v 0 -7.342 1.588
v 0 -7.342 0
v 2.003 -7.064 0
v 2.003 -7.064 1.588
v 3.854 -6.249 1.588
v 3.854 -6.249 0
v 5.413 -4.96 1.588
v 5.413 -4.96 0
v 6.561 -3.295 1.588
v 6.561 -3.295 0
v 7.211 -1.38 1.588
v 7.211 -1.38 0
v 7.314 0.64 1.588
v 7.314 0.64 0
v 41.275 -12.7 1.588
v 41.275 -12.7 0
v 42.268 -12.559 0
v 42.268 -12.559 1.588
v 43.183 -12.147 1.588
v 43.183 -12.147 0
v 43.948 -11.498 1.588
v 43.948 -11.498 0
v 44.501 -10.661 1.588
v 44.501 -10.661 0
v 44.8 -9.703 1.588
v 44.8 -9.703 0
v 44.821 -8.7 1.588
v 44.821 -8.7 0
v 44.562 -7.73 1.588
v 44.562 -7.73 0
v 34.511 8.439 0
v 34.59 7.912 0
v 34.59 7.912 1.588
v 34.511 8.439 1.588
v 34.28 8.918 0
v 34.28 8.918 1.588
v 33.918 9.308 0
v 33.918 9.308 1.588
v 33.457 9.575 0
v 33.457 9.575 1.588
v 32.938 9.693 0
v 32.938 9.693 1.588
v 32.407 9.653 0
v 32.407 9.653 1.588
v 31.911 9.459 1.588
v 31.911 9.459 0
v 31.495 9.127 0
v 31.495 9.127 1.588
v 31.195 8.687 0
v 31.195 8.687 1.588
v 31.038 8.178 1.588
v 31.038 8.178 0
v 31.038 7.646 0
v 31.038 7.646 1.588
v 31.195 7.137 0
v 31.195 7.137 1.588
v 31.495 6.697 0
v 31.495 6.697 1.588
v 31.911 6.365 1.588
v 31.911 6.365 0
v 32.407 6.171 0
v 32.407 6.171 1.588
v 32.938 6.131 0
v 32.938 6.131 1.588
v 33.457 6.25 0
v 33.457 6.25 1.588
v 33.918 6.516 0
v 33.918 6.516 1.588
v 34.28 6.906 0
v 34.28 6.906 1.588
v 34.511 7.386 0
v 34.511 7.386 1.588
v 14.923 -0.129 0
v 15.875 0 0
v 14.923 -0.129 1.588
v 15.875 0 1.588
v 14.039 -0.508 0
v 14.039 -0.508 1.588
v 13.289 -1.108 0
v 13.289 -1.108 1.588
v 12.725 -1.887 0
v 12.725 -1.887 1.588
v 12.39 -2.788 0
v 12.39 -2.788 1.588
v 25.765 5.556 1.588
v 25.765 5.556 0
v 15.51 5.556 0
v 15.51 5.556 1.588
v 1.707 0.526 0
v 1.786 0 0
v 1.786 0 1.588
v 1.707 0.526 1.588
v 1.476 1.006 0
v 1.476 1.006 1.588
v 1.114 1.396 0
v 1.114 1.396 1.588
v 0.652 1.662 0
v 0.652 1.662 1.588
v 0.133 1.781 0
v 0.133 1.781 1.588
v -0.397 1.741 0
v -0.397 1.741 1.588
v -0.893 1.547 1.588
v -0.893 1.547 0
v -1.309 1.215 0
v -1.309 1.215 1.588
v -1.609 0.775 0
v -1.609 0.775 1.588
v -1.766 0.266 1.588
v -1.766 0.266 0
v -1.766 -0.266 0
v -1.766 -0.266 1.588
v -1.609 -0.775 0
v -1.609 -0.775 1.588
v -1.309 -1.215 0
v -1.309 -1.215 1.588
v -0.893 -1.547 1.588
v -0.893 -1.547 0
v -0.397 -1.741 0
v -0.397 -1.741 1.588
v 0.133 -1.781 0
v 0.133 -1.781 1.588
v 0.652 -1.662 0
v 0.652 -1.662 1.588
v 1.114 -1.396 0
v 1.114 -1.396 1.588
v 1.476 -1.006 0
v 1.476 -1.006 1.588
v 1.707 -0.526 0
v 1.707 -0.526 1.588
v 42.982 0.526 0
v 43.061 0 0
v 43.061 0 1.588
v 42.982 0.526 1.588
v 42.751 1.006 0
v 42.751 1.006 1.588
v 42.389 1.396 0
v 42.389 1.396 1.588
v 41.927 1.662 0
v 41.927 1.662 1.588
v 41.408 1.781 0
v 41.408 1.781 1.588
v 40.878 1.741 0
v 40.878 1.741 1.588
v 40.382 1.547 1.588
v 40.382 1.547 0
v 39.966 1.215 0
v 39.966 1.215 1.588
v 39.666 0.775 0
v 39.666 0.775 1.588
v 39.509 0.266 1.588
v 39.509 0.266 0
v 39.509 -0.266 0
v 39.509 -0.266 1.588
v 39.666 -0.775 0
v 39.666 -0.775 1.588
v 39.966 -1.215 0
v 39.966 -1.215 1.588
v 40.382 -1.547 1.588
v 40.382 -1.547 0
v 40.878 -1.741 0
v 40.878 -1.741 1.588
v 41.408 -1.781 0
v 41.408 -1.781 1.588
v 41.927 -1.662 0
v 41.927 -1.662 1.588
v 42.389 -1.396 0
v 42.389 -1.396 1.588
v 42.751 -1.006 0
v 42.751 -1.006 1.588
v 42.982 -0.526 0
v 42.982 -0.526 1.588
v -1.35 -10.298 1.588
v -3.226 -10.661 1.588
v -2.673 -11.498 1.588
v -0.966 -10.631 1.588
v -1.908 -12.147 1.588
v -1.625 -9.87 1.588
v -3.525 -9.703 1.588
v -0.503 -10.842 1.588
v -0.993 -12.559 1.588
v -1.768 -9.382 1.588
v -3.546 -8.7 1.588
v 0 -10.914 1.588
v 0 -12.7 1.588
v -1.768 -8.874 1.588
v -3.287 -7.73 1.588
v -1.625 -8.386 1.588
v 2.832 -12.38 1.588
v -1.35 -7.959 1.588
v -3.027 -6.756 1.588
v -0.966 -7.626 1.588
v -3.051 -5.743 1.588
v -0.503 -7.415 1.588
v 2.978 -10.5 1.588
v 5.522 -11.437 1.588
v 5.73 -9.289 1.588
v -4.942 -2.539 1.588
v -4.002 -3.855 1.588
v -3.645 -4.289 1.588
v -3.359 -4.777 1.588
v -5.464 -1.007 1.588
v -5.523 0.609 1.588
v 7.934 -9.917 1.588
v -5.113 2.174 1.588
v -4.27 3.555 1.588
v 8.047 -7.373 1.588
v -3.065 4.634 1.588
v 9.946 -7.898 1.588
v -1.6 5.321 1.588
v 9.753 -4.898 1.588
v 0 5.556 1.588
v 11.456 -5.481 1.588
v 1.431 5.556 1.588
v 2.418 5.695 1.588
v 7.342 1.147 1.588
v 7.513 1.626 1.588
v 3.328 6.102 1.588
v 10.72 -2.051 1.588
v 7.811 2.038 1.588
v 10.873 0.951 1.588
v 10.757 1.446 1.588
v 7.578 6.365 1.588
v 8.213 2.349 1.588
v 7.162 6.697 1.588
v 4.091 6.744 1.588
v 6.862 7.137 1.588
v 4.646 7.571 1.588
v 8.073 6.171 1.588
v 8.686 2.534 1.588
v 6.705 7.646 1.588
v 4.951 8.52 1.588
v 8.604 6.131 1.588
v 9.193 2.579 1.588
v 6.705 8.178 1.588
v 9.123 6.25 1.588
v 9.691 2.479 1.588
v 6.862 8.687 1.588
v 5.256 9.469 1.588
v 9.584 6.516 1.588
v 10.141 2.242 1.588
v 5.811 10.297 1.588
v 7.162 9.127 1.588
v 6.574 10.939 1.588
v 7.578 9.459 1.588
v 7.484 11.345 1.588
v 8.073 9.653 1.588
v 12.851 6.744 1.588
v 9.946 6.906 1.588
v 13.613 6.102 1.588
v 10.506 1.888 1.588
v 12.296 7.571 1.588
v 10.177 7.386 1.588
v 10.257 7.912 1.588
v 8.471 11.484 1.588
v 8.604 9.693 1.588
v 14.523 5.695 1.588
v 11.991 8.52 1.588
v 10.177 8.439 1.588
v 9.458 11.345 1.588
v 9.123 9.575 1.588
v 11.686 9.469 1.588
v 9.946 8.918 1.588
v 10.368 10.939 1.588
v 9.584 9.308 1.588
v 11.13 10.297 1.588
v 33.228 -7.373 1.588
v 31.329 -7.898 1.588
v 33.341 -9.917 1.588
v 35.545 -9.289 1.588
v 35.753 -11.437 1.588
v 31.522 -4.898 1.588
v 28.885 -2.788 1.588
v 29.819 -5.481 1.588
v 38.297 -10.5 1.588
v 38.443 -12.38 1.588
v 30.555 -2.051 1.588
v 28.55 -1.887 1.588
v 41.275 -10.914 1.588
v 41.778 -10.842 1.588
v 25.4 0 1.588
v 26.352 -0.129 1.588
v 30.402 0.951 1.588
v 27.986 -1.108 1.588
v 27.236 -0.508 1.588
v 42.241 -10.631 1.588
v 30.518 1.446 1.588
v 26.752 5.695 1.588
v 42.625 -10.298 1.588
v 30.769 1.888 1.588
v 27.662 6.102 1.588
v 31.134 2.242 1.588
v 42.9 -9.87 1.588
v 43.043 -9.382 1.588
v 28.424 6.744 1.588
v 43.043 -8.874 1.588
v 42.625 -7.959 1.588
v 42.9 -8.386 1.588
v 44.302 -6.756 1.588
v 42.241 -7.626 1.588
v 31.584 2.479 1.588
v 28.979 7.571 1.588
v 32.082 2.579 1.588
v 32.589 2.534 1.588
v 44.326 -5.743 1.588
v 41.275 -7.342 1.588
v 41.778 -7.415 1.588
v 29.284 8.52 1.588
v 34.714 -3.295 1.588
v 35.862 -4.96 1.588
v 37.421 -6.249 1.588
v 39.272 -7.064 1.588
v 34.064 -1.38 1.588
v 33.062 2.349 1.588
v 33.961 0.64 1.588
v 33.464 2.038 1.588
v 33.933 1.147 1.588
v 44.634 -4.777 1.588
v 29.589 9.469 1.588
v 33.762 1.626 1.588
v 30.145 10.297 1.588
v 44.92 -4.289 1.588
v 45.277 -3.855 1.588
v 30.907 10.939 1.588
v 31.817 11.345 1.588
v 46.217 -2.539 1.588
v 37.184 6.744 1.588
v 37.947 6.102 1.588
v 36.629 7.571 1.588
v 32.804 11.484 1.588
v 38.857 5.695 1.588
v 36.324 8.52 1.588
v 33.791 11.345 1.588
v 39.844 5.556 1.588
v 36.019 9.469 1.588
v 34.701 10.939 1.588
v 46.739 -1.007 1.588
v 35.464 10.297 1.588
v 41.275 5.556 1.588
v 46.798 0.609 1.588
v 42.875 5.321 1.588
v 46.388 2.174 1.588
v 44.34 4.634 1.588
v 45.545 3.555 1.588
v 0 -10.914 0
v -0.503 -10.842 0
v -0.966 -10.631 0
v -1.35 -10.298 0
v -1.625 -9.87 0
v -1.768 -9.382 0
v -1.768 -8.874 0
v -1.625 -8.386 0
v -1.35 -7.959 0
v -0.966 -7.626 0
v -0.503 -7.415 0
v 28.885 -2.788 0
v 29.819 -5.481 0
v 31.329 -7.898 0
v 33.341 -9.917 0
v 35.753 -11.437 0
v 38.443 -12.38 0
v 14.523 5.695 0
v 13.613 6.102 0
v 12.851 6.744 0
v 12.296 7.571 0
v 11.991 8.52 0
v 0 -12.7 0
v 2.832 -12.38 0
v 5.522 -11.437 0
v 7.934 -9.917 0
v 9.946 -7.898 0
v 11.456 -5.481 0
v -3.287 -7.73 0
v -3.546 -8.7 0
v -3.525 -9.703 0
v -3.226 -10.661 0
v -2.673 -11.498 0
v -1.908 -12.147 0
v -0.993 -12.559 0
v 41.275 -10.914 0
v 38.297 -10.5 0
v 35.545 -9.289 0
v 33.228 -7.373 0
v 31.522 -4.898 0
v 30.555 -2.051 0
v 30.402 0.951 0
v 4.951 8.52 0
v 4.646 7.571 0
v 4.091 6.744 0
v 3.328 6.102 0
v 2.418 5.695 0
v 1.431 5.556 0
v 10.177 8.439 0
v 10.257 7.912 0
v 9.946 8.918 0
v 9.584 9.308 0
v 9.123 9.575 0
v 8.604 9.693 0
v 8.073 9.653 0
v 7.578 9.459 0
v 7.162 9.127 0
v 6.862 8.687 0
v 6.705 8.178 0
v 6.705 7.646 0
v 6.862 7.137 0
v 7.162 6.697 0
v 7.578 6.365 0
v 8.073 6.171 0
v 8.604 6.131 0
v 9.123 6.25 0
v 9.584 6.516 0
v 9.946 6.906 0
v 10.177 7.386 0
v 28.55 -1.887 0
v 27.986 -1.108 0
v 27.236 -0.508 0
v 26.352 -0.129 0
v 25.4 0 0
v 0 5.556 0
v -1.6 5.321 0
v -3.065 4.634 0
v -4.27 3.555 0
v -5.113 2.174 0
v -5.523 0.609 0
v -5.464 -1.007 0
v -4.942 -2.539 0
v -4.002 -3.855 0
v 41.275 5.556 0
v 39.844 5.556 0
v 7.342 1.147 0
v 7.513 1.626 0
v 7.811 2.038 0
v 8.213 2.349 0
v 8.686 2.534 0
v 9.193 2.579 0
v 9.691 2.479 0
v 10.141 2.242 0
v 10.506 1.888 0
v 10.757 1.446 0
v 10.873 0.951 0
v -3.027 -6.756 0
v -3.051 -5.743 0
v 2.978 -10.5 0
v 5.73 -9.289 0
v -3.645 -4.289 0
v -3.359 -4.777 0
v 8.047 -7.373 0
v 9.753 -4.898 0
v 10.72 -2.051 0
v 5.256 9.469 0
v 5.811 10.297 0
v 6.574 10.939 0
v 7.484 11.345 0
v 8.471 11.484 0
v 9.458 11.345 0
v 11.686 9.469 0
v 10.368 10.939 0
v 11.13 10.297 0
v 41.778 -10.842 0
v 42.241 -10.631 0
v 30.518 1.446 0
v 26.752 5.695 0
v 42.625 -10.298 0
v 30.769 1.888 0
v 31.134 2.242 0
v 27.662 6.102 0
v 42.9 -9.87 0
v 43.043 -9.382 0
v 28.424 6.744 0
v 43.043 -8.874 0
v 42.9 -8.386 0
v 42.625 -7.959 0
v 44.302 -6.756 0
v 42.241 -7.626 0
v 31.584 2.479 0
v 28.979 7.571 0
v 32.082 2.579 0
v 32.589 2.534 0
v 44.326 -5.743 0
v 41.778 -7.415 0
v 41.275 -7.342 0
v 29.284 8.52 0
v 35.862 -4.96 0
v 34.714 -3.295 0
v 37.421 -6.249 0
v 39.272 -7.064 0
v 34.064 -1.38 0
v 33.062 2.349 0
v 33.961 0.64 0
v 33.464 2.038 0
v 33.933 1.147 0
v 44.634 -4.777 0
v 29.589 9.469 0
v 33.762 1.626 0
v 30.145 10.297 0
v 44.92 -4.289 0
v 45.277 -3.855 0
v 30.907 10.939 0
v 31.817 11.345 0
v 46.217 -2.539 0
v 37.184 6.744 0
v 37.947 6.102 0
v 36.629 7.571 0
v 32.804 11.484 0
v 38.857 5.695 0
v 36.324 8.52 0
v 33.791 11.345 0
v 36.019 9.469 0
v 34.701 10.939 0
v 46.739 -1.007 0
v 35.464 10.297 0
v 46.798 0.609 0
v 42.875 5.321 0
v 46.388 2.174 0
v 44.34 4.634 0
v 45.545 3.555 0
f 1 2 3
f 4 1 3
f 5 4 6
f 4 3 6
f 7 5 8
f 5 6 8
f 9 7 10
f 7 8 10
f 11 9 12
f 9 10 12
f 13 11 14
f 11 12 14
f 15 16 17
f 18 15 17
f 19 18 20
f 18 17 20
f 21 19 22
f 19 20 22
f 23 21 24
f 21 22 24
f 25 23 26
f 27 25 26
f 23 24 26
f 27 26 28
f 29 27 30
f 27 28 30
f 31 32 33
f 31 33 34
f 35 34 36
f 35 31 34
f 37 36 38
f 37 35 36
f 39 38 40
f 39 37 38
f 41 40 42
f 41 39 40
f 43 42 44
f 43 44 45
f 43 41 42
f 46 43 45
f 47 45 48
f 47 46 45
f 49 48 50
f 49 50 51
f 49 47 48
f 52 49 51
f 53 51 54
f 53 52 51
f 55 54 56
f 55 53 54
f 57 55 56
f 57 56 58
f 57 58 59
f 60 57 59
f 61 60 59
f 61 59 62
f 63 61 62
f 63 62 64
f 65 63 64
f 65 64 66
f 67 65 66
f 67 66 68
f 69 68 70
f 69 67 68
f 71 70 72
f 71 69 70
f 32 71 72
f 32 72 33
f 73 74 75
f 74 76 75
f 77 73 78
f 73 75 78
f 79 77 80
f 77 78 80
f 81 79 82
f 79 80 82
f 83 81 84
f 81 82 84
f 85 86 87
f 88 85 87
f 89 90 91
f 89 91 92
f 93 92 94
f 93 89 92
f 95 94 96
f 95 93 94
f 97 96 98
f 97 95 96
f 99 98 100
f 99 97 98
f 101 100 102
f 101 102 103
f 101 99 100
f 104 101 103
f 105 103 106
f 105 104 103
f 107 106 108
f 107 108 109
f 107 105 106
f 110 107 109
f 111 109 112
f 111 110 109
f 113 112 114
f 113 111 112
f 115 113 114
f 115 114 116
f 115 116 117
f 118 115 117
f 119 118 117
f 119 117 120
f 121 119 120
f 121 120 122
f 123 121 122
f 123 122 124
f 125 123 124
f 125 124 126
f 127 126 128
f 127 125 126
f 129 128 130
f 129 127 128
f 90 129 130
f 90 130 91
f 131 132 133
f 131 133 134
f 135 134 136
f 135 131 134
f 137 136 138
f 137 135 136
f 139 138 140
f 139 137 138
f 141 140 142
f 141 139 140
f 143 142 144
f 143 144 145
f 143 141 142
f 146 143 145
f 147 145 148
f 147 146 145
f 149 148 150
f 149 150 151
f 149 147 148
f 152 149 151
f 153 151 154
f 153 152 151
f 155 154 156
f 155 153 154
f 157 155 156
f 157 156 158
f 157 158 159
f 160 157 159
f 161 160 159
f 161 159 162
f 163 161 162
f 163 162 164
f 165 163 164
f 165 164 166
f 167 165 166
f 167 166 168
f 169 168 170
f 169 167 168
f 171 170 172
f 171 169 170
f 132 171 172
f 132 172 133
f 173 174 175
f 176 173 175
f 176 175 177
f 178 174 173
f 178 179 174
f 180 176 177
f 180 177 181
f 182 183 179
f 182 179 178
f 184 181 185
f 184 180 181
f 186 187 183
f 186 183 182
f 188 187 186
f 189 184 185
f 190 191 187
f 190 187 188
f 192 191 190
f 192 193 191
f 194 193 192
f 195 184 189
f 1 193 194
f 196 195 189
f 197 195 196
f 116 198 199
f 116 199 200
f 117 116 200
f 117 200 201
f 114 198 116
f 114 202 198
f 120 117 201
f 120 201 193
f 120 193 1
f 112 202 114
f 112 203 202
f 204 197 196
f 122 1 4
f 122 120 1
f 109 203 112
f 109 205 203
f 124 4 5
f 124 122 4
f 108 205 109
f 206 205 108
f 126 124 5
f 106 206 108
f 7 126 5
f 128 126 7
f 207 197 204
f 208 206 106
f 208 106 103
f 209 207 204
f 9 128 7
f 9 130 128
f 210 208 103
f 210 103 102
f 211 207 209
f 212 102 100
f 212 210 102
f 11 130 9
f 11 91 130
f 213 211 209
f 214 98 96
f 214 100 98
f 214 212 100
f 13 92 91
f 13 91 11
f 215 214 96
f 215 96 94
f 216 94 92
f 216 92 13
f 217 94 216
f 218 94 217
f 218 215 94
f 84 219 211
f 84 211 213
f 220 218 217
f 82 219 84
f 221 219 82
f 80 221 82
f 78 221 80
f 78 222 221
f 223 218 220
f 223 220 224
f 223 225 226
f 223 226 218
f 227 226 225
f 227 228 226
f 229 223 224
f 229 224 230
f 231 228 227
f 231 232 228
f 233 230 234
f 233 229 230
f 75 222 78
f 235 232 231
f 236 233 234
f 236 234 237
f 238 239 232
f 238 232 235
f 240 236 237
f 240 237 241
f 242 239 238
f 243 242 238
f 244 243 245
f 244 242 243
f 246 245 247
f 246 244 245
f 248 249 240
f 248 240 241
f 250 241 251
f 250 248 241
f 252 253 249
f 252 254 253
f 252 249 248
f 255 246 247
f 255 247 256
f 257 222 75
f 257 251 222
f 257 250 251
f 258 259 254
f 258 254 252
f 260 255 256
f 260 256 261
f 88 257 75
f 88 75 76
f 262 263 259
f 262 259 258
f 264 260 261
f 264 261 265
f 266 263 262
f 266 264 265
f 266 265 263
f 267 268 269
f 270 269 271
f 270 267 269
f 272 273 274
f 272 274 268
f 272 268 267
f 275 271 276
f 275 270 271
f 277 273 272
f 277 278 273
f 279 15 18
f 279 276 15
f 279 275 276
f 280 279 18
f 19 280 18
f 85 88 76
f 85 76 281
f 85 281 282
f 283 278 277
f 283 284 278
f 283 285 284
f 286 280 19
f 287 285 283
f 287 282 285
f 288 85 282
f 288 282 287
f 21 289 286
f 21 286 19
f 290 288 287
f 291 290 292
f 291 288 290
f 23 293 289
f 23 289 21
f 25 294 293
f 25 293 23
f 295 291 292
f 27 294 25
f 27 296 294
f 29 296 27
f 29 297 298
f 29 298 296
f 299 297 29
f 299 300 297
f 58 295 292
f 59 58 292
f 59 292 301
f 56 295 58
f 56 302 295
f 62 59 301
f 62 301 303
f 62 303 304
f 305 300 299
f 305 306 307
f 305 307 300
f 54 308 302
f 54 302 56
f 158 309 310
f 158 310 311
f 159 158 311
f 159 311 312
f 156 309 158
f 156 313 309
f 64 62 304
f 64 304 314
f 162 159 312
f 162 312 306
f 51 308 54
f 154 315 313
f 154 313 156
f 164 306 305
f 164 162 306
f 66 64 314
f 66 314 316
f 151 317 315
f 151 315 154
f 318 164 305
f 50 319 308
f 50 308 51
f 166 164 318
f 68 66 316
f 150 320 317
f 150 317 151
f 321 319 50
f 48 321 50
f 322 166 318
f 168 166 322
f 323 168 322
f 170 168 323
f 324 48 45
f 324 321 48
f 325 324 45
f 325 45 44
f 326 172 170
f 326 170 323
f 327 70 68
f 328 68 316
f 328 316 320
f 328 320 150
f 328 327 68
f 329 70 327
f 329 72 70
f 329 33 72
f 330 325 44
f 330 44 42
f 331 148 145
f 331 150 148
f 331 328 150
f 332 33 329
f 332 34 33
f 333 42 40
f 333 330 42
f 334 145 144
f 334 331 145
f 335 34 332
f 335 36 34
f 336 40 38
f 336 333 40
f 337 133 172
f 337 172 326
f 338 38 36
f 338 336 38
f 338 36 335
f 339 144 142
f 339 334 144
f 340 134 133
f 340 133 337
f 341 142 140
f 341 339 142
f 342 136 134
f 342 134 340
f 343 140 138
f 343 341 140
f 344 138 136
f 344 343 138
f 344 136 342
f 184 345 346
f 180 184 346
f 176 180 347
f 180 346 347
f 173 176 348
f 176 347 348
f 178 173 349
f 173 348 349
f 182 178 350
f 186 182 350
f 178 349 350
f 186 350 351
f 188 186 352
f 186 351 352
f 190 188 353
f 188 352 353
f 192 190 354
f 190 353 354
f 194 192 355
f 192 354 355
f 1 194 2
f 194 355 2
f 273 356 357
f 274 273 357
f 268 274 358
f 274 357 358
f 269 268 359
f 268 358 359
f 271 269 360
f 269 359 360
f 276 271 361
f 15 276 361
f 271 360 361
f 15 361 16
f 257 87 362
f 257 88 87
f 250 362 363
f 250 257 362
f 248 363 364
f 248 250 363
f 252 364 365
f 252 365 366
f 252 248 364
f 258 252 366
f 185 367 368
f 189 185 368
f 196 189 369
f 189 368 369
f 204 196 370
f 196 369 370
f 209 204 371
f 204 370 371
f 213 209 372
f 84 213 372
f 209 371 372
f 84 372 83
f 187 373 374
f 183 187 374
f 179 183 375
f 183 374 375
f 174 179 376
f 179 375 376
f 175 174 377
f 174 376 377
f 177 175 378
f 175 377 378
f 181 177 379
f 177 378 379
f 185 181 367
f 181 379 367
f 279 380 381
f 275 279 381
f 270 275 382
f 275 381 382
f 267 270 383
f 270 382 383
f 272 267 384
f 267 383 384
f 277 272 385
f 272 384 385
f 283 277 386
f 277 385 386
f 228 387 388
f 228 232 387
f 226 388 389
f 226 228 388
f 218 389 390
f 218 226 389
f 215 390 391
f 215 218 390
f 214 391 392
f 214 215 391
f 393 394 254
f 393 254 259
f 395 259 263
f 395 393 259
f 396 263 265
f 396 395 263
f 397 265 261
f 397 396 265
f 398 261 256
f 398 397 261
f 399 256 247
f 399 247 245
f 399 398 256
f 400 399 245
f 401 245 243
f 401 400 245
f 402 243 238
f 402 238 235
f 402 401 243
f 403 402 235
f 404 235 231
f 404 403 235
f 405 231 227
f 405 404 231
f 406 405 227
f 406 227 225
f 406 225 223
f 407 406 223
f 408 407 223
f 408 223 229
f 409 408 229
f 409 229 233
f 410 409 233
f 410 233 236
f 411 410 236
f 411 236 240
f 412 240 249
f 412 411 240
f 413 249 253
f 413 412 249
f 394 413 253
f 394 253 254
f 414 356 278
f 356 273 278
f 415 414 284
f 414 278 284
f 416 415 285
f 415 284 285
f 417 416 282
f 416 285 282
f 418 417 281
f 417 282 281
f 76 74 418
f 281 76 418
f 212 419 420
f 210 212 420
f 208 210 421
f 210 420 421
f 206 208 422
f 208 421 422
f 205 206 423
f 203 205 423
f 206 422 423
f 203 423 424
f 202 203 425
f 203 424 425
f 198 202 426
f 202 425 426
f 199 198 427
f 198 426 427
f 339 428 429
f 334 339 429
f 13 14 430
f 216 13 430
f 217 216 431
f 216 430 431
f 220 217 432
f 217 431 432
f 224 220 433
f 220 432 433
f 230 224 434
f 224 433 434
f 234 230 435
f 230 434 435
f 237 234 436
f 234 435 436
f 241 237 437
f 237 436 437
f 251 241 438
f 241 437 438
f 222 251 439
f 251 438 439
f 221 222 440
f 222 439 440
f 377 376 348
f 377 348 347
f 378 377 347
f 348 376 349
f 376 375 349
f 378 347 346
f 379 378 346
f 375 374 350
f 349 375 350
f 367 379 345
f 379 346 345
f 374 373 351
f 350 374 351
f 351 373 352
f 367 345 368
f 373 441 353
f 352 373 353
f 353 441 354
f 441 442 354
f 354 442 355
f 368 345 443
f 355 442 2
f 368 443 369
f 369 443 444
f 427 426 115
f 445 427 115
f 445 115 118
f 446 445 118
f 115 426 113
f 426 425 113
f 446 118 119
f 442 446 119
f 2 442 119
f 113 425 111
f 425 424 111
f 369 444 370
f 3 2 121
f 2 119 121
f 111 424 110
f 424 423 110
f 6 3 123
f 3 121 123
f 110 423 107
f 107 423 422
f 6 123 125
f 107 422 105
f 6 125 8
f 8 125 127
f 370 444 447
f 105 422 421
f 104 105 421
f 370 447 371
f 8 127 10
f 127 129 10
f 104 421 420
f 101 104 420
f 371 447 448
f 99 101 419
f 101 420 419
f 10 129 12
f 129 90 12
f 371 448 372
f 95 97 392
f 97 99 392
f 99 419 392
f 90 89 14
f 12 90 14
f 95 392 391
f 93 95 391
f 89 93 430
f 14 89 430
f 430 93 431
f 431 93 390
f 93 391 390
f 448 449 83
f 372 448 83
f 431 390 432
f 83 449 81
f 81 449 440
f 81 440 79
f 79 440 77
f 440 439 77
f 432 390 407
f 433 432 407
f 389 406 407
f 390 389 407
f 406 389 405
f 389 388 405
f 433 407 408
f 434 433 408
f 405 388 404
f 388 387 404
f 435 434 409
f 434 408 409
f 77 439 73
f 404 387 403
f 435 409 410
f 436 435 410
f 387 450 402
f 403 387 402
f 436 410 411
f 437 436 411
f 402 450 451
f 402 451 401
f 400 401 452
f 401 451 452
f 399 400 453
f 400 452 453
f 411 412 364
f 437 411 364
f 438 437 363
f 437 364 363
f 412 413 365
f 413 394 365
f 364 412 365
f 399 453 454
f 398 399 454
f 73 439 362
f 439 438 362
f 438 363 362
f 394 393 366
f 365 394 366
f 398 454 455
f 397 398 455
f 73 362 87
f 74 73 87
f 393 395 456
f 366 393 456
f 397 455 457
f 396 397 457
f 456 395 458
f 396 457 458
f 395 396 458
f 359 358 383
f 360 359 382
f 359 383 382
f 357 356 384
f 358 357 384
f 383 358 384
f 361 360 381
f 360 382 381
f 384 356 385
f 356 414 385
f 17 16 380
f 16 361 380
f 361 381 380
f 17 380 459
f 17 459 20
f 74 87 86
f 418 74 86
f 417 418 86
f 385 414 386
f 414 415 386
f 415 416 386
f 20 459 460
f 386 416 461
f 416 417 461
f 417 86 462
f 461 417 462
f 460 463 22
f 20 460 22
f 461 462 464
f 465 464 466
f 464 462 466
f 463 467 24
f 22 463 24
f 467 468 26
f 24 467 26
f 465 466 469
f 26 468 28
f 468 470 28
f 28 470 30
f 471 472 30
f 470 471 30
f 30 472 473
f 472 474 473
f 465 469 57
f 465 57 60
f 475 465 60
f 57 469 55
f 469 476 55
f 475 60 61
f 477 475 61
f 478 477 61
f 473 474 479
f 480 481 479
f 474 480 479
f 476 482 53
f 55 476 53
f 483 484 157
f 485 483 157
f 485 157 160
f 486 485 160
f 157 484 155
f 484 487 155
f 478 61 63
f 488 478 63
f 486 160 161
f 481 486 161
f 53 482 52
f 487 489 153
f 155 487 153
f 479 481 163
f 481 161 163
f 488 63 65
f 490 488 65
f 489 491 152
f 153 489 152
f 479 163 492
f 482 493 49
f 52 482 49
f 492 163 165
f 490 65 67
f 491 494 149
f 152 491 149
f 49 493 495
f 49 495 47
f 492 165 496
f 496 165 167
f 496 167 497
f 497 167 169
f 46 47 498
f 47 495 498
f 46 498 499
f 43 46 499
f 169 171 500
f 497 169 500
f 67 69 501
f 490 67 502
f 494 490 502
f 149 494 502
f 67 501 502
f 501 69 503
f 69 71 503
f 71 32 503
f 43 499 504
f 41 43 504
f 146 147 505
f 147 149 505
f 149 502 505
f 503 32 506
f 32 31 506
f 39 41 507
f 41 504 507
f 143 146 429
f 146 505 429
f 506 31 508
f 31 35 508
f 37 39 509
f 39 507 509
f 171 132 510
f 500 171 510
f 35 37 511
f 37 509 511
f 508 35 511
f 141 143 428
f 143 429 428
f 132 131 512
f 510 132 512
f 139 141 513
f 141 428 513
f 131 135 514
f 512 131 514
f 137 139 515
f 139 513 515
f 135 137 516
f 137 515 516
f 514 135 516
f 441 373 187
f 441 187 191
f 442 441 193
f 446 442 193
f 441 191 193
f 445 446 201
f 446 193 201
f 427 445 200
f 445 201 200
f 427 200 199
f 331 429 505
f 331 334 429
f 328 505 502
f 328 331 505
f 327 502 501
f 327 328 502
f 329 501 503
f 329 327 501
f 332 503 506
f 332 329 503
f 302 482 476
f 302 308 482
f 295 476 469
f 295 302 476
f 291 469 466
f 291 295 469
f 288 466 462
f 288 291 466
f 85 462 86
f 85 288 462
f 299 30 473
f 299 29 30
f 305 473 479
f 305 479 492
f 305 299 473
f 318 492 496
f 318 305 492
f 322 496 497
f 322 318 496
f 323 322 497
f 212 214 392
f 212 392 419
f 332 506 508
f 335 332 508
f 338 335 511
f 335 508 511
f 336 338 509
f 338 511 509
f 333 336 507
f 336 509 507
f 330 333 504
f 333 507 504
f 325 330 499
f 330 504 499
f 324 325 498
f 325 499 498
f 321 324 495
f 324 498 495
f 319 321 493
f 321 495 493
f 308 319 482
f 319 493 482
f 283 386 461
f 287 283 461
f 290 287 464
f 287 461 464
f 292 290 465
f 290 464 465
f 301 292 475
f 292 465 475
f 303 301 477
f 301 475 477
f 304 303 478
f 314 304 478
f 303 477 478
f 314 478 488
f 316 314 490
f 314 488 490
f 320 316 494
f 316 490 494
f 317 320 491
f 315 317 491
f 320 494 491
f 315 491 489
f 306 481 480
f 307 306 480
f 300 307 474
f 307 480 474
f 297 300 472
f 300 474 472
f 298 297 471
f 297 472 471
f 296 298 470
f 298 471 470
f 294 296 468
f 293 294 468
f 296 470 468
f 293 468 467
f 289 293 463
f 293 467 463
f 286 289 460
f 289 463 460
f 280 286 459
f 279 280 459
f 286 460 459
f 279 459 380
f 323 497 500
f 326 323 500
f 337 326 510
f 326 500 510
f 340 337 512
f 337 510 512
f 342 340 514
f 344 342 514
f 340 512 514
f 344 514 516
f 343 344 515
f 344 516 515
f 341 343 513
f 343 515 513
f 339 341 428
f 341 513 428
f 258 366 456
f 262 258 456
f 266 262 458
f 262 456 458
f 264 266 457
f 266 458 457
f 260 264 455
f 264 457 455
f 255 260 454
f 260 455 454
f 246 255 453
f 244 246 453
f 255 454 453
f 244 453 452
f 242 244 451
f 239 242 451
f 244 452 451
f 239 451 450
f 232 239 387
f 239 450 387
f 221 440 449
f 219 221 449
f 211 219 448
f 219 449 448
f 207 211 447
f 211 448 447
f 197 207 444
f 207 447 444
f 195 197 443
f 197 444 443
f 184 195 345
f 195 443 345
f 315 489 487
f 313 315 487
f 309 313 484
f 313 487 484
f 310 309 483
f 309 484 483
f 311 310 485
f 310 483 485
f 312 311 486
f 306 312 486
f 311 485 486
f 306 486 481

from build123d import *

# Parameters (mm, degrees)
SKETCH1_R           = 1.7859375
BOSS_EXTRUDE1_DEPTH = 1.5875
FILLET1_R           = 3.571875


with BuildPart() as part:
    # Sketch1 → Boss-Extrude1 (new body)
    with BuildSketch(Plane.XY):
        with BuildLine():
            ThreePointArc((41.275, -12.7), (44.846875, -9.128125), (41.275, -5.55625))
            ThreePointArc((41.275, -5.55625), (46.83125, 0), (41.275, 5.55625))
            Line((41.275, 5.55625), (35.489019559, 5.55625))
            ThreePointArc((35.489019559, 5.55625), (32.804229109, 11.484009389), (30.119438658, 5.55625))
            Line((30.119438658, 5.55625), (11.155561342, 5.55625))
            ThreePointArc((11.155561342, 5.55625), (8.470770891, 11.484009389), (5.785980441, 5.55625))
            Line((5.785980441, 5.55625), (0, 5.55625))
            ThreePointArc((0, 5.55625), (-5.55625, 0), (0, -5.55625))
            ThreePointArc((0, -5.55625), (-3.571875, -9.128125), (0, -12.7))
            ThreePointArc((0, -12.7), (8.980256121, -8.980256121), (12.7, 0))
            Line((12.7, 0), (28.575, 0))
            ThreePointArc((28.575, 0), (32.294743879, -8.980256121), (41.275, -12.7))
        make_face()
        with BuildLine():
            ThreePointArc((0, -10.9140625), (-1.7859375, -9.128125), (0, -7.3421875))
            ThreePointArc((0, -7.3421875), (5.413228446, -4.960309977), (7.31424826, 0.639913805))
            ThreePointArc((7.31424826, 0.639913805), (8.937735019, 2.574709983), (10.872531197, 0.951223224))
            ThreePointArc((10.872531197, 0.951223224), (8.046690934, -7.37343375), (0, -10.9140625))
        make_face(mode=Mode.SUBTRACT)
        with BuildLine():
            ThreePointArc((33.96075174, 0.639913805), (35.861771554, -4.960309977), (41.275, -7.3421875))
            ThreePointArc((41.275, -7.3421875), (43.0609375, -9.128125), (41.275, -10.9140625))
            ThreePointArc((41.275, -10.9140625), (33.228309066, -7.37343375), (30.402468803, 0.951223224))
            ThreePointArc((30.402468803, 0.951223224), (32.337264981, 2.574709983), (33.96075174, 0.639913805))
        make_face(mode=Mode.SUBTRACT)
        Circle(SKETCH1_R, mode=Mode.SUBTRACT)
        with Locations((8.470770891, 7.912134389)):
            Circle(SKETCH1_R, mode=Mode.SUBTRACT)
        with Locations((41.275, 0)):
            Circle(SKETCH1_R, mode=Mode.SUBTRACT)
        with Locations((32.804229109, 7.912134389)):
            Circle(SKETCH1_R, mode=Mode.SUBTRACT)
    extrude(amount=BOSS_EXTRUDE1_DEPTH)

    # Fillet1
    fillet1_edges = [part.edges().sort_by_distance(p)[0] for p in [
        (5.785980441, 5.55625, 0.79375),
        (11.155561342, 5.55625, 0.79375),
        (30.119438658, 5.55625, 0.79375),
        (35.489019559, 5.55625, 0.79375),
        (41.275, -5.55625, 0.79375),
        (28.575, 0, 0.79375),
        (12.7, 0, 0.79375),
        (0, -5.55625, 0.79375),
    ]]
    fillet(fillet1_edges, radius=FILLET1_R)


solid = part.part
